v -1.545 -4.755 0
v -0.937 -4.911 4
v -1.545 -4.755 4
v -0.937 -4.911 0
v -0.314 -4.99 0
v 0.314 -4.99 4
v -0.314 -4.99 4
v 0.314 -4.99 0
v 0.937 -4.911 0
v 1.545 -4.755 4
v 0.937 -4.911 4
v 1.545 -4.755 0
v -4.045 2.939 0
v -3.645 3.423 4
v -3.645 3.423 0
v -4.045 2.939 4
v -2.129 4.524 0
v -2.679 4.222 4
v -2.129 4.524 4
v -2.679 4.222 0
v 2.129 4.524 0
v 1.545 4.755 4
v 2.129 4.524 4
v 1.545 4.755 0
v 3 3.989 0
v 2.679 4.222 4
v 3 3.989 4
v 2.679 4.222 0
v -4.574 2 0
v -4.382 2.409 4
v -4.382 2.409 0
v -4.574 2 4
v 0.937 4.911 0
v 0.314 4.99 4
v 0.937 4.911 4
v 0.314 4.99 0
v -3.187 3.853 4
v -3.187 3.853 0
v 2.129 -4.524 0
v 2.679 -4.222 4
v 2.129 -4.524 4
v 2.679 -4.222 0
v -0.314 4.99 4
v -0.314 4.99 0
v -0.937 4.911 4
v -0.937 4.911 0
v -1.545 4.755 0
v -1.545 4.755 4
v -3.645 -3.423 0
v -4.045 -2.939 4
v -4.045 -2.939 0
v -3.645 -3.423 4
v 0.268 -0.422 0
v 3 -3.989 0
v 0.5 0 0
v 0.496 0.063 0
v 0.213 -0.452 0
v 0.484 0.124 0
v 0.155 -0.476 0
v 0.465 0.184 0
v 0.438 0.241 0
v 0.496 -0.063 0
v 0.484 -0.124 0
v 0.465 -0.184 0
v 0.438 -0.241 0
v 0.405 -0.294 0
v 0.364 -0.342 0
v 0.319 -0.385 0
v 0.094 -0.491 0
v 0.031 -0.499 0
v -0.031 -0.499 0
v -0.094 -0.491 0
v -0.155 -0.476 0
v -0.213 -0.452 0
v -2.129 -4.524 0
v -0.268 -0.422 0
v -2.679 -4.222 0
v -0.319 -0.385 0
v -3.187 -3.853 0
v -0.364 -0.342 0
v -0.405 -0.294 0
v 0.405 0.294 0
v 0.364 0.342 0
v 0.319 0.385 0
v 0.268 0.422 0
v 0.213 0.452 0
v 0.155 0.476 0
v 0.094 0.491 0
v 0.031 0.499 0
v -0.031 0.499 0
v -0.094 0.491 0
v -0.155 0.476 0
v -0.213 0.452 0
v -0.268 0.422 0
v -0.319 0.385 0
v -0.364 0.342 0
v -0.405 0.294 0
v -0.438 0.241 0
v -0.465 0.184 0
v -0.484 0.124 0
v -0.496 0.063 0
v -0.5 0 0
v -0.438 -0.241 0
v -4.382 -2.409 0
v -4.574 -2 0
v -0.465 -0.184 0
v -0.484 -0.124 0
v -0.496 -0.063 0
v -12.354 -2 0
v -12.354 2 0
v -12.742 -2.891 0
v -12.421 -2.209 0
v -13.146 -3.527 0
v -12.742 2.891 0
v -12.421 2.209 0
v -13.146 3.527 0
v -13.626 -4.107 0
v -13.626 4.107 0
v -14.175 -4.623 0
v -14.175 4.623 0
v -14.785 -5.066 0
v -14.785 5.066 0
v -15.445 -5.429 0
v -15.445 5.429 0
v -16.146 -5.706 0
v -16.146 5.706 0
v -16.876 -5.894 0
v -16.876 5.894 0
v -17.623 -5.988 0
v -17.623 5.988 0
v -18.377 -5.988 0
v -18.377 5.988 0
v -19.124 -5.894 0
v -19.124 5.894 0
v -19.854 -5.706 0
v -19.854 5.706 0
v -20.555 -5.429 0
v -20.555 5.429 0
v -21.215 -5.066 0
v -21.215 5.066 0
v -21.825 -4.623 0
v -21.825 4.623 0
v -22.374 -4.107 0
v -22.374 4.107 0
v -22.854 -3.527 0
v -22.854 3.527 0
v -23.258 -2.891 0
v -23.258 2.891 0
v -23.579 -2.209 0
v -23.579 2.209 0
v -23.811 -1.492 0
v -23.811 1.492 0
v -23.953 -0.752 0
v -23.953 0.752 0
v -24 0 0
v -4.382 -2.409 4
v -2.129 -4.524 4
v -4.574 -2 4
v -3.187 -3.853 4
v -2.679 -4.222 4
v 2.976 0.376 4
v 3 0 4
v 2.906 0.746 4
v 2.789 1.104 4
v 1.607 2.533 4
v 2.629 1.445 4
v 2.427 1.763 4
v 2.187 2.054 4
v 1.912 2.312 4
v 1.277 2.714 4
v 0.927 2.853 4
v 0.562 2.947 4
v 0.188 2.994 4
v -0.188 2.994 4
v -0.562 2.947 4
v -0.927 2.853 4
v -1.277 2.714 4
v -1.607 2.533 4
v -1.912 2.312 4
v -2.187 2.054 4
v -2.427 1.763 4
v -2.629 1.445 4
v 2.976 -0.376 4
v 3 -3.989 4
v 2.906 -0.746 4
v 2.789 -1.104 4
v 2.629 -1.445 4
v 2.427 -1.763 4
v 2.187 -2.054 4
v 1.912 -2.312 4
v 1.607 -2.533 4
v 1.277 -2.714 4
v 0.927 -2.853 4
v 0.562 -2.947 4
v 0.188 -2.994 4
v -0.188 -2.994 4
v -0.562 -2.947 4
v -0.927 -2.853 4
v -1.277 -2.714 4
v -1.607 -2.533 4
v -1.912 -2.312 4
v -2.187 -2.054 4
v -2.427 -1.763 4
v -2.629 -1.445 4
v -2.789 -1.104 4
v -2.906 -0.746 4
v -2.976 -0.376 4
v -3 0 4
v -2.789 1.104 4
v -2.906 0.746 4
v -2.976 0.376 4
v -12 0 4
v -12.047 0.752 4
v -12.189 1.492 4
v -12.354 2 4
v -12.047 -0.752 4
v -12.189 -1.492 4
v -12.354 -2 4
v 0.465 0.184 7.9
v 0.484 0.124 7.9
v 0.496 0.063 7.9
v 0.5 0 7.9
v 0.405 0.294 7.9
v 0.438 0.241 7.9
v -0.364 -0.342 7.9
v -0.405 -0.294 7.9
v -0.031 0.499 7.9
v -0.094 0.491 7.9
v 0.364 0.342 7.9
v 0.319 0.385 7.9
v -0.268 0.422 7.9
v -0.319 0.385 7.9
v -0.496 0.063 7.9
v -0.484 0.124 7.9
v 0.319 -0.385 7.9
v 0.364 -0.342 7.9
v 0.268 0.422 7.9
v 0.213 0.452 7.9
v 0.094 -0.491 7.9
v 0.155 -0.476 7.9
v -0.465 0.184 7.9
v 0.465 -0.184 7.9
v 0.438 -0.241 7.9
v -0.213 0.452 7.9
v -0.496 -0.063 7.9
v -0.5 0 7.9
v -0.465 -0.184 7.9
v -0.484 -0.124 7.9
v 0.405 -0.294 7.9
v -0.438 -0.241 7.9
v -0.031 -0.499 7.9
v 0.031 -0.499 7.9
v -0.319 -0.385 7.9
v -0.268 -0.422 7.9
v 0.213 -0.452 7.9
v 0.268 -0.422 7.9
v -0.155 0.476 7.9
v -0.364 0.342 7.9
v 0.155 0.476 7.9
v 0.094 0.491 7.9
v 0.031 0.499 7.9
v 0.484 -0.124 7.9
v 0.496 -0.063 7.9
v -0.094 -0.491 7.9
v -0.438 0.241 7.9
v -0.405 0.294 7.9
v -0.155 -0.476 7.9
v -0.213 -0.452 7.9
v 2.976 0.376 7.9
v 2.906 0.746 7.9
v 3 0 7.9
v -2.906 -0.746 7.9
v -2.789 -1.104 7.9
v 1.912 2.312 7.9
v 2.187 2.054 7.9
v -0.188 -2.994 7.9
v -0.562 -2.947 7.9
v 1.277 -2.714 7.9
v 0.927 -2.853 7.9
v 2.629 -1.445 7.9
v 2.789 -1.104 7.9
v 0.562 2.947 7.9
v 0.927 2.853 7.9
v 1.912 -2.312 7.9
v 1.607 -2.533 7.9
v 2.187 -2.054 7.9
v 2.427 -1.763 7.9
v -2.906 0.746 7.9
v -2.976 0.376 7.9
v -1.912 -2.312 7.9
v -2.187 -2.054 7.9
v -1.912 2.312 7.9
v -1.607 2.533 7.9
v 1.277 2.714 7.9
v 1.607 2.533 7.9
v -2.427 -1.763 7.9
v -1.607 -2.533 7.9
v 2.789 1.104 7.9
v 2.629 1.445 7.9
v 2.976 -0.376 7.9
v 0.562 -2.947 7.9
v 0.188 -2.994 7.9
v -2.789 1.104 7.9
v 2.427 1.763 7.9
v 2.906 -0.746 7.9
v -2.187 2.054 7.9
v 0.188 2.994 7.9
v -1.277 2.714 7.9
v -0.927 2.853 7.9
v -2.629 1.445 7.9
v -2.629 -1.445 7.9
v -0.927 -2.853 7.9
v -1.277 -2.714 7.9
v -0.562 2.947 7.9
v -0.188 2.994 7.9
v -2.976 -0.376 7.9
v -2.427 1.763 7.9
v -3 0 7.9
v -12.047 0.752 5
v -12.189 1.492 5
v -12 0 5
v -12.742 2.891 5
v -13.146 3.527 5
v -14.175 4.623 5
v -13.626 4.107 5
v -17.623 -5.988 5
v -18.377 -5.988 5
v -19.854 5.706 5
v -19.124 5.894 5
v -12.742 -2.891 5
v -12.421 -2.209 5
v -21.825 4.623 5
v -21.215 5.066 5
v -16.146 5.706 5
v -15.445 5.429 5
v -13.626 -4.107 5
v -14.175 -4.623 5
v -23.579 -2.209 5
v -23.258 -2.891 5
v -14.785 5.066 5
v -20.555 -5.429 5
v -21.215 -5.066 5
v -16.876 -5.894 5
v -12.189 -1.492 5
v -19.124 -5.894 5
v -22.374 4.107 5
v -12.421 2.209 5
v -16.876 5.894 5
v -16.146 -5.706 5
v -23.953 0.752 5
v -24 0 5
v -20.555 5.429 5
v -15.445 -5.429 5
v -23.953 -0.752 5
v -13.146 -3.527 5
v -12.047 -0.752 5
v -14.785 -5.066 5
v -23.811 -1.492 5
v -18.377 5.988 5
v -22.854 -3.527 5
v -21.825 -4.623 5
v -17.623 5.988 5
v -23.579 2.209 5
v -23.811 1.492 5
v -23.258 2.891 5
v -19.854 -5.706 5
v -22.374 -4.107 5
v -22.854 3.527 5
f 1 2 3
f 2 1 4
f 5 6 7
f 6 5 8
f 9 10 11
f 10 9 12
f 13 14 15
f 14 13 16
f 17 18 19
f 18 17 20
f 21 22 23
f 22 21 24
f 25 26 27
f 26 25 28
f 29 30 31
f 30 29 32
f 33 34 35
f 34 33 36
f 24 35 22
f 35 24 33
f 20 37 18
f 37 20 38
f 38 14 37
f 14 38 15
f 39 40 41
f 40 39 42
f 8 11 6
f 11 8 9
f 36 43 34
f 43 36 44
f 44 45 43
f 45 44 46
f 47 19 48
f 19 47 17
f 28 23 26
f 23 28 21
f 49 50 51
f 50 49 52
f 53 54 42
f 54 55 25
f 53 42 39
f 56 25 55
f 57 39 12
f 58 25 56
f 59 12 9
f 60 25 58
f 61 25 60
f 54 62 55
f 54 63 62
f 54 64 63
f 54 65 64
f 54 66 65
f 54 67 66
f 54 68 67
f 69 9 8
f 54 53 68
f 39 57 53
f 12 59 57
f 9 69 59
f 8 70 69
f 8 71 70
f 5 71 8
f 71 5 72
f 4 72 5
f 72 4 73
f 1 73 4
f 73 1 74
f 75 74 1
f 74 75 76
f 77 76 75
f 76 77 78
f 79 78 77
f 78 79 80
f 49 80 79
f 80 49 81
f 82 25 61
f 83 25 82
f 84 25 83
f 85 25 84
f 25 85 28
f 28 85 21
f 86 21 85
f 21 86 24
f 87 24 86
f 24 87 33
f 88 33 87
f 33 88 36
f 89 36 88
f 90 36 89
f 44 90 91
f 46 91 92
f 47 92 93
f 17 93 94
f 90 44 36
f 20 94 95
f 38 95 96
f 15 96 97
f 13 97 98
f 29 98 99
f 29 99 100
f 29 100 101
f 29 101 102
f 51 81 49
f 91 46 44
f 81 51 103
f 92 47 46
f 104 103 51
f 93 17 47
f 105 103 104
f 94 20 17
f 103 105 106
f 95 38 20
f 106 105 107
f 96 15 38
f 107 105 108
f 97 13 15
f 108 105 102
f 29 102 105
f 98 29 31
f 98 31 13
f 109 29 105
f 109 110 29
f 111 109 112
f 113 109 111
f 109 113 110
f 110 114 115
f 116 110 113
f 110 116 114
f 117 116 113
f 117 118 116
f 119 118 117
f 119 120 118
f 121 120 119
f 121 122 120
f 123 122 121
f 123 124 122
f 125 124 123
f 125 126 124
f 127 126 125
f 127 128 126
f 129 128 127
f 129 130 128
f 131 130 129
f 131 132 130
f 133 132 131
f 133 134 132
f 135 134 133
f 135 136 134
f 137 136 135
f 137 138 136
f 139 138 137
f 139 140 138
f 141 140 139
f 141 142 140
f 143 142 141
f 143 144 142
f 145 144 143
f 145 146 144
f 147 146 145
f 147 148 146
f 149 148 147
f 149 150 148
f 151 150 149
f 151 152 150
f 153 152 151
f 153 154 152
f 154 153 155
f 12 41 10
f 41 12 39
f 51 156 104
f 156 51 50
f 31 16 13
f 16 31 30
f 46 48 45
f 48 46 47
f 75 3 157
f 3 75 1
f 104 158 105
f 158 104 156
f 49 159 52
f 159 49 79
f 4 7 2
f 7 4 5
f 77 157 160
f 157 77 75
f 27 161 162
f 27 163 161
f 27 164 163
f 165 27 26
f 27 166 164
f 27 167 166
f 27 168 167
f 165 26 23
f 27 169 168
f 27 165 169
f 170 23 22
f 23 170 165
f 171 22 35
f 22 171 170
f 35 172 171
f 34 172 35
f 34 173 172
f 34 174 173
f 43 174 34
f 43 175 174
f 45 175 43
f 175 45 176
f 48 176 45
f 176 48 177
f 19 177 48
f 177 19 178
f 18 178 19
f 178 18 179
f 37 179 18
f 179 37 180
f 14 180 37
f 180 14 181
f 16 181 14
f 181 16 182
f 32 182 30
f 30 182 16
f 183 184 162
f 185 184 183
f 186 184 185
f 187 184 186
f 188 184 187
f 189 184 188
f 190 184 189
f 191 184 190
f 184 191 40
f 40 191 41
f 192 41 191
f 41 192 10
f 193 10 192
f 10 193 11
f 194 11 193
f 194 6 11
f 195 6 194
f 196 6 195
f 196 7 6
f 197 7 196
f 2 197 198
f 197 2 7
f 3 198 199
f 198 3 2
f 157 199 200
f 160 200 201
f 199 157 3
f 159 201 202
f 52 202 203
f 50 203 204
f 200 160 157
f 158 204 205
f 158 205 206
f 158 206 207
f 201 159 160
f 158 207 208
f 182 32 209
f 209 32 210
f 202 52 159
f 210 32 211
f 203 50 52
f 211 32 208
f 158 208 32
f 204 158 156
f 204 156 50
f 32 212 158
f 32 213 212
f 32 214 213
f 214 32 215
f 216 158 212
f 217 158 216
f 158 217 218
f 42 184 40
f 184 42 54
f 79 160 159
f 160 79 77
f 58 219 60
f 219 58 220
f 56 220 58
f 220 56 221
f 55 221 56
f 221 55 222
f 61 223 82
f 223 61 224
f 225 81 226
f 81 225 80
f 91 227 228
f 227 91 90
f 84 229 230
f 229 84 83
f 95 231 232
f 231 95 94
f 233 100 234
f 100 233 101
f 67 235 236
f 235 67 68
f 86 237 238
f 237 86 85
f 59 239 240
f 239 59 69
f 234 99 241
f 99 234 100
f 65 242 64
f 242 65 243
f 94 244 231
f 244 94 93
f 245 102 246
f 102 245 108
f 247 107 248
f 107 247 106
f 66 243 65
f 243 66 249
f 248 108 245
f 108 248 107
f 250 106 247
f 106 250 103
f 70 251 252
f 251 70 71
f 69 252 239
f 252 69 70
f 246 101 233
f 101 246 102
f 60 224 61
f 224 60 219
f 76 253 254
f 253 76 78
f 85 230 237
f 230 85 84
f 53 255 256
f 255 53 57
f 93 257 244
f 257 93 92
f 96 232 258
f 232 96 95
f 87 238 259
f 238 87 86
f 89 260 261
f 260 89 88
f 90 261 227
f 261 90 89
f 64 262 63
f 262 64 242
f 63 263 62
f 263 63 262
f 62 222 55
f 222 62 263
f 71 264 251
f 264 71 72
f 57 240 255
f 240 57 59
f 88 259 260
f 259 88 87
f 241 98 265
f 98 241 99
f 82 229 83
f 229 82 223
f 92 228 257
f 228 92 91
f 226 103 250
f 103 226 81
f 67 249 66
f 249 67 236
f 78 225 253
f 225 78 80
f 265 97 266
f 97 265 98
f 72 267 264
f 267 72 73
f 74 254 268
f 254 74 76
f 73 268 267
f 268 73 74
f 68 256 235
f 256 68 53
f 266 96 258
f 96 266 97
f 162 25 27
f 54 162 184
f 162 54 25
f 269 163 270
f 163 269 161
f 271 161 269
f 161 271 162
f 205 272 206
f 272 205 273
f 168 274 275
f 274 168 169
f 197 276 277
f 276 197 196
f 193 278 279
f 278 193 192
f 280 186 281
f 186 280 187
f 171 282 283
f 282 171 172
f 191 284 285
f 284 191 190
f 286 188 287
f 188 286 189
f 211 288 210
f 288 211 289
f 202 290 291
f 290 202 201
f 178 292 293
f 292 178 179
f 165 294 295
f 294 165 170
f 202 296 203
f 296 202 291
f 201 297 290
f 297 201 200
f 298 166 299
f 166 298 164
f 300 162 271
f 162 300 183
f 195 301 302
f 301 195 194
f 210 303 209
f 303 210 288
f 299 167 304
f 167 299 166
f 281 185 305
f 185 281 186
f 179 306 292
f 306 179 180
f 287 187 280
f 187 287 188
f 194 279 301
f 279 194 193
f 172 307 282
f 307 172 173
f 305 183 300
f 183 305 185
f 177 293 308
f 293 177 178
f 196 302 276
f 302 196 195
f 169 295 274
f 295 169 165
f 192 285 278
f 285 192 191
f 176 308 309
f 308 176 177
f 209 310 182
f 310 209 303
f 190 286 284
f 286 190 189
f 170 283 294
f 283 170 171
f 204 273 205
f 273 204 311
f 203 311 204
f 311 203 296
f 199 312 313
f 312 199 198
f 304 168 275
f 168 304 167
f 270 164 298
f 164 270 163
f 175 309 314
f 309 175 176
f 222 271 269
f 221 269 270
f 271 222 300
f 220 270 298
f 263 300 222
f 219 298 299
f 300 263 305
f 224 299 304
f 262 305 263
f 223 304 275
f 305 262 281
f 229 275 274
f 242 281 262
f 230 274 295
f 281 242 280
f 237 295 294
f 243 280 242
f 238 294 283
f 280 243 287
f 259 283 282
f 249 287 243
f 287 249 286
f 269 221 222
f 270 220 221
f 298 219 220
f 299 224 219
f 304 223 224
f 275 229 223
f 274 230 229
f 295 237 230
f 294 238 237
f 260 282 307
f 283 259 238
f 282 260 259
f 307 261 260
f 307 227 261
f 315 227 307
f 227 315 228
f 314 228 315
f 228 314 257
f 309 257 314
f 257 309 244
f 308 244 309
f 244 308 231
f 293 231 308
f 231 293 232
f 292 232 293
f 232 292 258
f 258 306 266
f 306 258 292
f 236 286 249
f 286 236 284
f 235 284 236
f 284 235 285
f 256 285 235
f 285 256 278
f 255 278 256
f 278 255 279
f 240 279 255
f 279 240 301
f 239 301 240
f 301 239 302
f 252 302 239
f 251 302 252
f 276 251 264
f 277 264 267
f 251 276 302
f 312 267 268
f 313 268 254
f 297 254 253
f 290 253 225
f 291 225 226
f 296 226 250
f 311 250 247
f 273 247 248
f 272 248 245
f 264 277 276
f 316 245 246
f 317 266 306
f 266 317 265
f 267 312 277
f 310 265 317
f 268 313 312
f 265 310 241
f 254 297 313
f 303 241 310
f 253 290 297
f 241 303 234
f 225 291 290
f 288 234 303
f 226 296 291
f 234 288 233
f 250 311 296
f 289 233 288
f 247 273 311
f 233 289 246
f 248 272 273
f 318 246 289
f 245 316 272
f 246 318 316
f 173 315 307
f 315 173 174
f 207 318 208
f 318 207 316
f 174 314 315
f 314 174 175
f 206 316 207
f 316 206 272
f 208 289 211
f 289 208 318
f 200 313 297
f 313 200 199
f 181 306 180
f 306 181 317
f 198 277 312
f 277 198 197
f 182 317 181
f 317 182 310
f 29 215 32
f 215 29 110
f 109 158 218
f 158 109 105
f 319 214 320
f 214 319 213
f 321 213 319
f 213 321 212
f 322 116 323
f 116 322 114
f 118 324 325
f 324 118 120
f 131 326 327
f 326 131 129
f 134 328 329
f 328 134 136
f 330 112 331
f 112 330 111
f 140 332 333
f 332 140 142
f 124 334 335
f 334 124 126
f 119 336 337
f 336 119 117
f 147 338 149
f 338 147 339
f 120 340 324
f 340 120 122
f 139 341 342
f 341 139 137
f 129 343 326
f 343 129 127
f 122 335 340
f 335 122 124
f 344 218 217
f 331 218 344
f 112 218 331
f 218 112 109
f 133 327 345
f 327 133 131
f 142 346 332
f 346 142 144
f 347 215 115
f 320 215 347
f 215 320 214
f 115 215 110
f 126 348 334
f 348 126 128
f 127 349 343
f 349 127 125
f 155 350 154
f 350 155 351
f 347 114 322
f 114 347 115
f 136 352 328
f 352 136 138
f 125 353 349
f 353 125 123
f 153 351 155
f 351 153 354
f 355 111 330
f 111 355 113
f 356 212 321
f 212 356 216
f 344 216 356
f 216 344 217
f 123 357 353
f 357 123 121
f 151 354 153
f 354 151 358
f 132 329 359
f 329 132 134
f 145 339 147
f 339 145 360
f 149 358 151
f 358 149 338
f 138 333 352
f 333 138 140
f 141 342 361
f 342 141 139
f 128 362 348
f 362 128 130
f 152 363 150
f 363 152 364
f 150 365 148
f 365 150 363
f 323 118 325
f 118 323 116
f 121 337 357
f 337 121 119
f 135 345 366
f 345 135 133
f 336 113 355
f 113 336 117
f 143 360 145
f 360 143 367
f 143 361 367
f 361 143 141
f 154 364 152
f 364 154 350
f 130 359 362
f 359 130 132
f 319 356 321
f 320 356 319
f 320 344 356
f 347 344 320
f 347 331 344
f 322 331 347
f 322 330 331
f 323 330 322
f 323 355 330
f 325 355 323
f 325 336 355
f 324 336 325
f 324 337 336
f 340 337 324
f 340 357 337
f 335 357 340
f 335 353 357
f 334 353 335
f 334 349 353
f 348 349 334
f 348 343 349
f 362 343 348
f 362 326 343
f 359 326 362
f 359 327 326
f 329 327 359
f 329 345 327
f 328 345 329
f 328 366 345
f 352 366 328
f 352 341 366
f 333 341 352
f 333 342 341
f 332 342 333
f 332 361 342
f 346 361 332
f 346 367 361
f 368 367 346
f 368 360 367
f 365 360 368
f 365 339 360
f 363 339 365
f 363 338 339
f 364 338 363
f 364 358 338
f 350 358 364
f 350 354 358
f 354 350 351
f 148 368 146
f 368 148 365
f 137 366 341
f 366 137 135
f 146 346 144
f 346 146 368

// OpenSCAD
/*
	Parametric Eccentric Weight for Vibrobot 
	by Kevin Osborn
*/
//Shaft Diameter in mm  
shaftdiameter = 1.0; 
//Weight Diameter in mm
weightdiameter =12;
//Arm Length in mm
armLength = 12;

/* [hidden] */
shaftR = shaftdiameter/2;
weightR = weightdiameter/2;
$fn=50;

union(){
difference(){
cylinder(r1=5,r2=5,h=4);
cylinder(r1=shaftR,r2=shaftR,h=15);
translate([3,-7,0])cube([14,14,5]);
}
translate([-armLength-2,-2,0])cube([armLength,4,4]);
translate([-(armLength+weightR),0,0])cylinder(r1=weightR,r2=weightR,h=5);
difference(){
translate([0,0,3.9])cylinder(r1=3,r2=3,h=4);
cylinder(r1=shaftR,r2=shaftR,h=15);
}
}
